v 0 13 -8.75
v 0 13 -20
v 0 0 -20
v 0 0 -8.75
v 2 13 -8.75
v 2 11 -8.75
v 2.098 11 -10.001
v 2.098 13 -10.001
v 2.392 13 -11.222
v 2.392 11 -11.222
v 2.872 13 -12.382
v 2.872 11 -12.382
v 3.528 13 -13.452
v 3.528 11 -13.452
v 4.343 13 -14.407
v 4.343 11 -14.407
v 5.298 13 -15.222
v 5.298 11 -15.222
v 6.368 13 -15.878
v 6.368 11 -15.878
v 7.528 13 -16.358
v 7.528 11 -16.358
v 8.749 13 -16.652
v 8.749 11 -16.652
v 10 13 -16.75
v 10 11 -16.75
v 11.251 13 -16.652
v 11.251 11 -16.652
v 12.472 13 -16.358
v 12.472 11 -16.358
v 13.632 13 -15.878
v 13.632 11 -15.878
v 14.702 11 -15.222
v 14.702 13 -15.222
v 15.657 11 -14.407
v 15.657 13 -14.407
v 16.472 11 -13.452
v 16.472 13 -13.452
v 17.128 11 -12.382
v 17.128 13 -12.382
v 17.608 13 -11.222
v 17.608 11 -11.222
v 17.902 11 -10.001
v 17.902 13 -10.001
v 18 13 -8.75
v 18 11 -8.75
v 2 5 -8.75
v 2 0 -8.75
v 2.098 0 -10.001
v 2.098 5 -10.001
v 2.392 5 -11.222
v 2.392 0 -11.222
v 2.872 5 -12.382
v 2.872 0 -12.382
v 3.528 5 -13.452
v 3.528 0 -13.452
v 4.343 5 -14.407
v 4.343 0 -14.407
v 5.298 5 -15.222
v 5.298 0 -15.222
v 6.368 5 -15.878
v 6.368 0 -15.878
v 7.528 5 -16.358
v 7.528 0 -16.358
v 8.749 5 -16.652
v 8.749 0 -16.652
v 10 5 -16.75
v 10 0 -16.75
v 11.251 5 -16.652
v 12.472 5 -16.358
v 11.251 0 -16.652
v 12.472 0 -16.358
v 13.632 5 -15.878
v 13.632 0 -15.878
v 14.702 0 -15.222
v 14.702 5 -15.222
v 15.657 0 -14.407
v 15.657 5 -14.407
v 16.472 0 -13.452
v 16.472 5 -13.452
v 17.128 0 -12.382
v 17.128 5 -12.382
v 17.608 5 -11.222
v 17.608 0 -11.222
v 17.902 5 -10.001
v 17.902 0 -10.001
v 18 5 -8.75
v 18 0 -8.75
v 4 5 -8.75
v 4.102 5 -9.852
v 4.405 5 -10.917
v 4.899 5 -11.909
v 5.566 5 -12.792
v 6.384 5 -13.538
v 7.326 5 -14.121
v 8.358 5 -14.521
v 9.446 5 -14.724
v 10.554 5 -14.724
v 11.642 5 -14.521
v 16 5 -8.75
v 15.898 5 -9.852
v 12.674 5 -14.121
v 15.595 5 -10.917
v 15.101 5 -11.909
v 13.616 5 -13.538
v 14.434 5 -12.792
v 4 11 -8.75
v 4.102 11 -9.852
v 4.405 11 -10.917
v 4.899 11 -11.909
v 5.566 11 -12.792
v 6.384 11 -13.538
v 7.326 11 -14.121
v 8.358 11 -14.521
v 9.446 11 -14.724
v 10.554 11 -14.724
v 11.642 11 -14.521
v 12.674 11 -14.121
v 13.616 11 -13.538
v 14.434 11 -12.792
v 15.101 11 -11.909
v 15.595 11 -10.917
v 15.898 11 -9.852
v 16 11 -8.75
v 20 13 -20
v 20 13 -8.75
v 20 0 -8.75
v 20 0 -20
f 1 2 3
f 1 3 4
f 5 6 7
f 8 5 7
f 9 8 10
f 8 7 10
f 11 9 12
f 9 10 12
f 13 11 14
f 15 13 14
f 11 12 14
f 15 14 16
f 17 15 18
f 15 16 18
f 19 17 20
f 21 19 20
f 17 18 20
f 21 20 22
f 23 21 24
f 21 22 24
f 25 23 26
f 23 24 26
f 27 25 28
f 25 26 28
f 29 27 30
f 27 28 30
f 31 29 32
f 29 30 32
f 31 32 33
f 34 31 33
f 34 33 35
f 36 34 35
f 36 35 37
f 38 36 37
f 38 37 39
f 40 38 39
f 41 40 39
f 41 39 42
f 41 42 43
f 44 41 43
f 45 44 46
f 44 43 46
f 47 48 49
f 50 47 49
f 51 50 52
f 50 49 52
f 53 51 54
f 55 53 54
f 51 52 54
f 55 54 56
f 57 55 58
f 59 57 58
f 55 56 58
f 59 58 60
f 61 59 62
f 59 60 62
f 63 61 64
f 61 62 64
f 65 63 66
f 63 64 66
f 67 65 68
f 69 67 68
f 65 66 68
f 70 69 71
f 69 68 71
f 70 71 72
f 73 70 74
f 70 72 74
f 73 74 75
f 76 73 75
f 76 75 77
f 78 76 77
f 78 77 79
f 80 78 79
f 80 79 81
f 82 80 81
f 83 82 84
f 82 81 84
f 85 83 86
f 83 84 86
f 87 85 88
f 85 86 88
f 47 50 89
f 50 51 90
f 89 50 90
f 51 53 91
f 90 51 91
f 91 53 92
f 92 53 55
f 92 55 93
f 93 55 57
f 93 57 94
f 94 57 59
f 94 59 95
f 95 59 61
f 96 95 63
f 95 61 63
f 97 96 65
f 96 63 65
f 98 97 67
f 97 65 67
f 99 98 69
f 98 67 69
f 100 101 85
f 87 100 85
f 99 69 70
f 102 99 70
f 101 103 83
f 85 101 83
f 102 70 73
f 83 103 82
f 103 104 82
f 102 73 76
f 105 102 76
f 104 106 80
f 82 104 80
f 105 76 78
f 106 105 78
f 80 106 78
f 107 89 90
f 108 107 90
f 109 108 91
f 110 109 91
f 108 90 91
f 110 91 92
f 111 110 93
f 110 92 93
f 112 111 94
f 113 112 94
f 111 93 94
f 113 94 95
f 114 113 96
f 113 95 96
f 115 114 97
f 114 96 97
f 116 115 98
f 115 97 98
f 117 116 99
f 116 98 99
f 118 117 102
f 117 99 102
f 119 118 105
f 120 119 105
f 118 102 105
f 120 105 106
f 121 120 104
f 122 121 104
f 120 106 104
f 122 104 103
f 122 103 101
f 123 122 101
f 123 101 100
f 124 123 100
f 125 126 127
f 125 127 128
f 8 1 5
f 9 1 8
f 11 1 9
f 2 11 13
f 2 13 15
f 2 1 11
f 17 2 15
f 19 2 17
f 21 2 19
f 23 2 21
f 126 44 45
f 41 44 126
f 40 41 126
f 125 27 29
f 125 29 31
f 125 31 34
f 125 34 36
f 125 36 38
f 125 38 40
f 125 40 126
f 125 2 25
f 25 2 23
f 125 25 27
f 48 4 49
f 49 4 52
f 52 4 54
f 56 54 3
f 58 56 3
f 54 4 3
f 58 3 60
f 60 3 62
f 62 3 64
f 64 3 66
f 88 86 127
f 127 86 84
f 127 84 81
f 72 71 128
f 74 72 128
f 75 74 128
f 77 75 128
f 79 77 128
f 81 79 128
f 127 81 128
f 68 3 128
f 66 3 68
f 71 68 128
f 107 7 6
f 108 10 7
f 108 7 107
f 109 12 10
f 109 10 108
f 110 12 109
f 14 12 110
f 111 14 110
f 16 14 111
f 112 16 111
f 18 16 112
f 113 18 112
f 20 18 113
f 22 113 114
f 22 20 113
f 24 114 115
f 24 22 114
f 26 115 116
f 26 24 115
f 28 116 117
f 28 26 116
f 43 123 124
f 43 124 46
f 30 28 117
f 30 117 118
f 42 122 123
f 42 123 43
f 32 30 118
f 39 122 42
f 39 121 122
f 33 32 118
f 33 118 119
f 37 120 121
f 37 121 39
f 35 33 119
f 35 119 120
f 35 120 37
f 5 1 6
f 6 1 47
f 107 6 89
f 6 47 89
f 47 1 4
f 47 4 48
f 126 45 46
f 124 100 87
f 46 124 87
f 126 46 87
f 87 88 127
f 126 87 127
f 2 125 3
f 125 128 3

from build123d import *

# Parameters (mm, degrees)
EXTRUDE_1_DEPTH = 5
EXTRUDE_2_DEPTH = 6
EXTRUDE_3_DEPTH = 2


with BuildPart() as part:
    # 草图1 → 凸台-拉伸1 (new body)
    with BuildSketch(Plane(origin=(0, 0, 0), x_dir=(1, 0, 0), z_dir=(0, 1, 0))):
        with BuildLine():
            Line((0, 8.75), (2, 8.75))
            ThreePointArc((2, 8.75), (10, 16.75), (18, 8.75))
            Line((18, 8.75), (20, 8.75))
            Line((20, 8.75), (20, 20))
            Line((20, 20), (0, 20))
            Line((0, 20), (0, 8.75))
        make_face()
    extrude(amount=EXTRUDE_1_DEPTH)

    # 草图2 → 凸台-拉伸2 (add)
    with BuildSketch(Plane(origin=(0, 5, 0), x_dir=(1, 0, 0), z_dir=(0, 1, 0))):
        with BuildLine():
            Line((16, 8.75), (20, 8.75))
            Line((20, 8.75), (20, 20))
            Line((20, 20), (0, 20))
            Line((0, 20), (0, 8.75))
            Line((0, 8.75), (4, 8.75))
            ThreePointArc((4, 8.75), (10, 14.75), (16, 8.75))
        make_face()
    extrude(amount=EXTRUDE_2_DEPTH)

    # 草图3 → 凸台-拉伸3 (add)
    with BuildSketch(Plane(origin=(0, 11, 0), x_dir=(1, 0, 0), z_dir=(0, 1, 0))):
        with BuildLine():
            Line((18, 8.75), (20, 8.75))
            Line((20, 8.75), (20, 20))
            Line((20, 20), (0, 20))
            Line((0, 20), (0, 8.75))
            Line((0, 8.75), (2, 8.75))
            ThreePointArc((2, 8.75), (10, 16.75), (18, 8.75))
        make_face()
    extrude(amount=EXTRUDE_3_DEPTH)


solid = part.part
